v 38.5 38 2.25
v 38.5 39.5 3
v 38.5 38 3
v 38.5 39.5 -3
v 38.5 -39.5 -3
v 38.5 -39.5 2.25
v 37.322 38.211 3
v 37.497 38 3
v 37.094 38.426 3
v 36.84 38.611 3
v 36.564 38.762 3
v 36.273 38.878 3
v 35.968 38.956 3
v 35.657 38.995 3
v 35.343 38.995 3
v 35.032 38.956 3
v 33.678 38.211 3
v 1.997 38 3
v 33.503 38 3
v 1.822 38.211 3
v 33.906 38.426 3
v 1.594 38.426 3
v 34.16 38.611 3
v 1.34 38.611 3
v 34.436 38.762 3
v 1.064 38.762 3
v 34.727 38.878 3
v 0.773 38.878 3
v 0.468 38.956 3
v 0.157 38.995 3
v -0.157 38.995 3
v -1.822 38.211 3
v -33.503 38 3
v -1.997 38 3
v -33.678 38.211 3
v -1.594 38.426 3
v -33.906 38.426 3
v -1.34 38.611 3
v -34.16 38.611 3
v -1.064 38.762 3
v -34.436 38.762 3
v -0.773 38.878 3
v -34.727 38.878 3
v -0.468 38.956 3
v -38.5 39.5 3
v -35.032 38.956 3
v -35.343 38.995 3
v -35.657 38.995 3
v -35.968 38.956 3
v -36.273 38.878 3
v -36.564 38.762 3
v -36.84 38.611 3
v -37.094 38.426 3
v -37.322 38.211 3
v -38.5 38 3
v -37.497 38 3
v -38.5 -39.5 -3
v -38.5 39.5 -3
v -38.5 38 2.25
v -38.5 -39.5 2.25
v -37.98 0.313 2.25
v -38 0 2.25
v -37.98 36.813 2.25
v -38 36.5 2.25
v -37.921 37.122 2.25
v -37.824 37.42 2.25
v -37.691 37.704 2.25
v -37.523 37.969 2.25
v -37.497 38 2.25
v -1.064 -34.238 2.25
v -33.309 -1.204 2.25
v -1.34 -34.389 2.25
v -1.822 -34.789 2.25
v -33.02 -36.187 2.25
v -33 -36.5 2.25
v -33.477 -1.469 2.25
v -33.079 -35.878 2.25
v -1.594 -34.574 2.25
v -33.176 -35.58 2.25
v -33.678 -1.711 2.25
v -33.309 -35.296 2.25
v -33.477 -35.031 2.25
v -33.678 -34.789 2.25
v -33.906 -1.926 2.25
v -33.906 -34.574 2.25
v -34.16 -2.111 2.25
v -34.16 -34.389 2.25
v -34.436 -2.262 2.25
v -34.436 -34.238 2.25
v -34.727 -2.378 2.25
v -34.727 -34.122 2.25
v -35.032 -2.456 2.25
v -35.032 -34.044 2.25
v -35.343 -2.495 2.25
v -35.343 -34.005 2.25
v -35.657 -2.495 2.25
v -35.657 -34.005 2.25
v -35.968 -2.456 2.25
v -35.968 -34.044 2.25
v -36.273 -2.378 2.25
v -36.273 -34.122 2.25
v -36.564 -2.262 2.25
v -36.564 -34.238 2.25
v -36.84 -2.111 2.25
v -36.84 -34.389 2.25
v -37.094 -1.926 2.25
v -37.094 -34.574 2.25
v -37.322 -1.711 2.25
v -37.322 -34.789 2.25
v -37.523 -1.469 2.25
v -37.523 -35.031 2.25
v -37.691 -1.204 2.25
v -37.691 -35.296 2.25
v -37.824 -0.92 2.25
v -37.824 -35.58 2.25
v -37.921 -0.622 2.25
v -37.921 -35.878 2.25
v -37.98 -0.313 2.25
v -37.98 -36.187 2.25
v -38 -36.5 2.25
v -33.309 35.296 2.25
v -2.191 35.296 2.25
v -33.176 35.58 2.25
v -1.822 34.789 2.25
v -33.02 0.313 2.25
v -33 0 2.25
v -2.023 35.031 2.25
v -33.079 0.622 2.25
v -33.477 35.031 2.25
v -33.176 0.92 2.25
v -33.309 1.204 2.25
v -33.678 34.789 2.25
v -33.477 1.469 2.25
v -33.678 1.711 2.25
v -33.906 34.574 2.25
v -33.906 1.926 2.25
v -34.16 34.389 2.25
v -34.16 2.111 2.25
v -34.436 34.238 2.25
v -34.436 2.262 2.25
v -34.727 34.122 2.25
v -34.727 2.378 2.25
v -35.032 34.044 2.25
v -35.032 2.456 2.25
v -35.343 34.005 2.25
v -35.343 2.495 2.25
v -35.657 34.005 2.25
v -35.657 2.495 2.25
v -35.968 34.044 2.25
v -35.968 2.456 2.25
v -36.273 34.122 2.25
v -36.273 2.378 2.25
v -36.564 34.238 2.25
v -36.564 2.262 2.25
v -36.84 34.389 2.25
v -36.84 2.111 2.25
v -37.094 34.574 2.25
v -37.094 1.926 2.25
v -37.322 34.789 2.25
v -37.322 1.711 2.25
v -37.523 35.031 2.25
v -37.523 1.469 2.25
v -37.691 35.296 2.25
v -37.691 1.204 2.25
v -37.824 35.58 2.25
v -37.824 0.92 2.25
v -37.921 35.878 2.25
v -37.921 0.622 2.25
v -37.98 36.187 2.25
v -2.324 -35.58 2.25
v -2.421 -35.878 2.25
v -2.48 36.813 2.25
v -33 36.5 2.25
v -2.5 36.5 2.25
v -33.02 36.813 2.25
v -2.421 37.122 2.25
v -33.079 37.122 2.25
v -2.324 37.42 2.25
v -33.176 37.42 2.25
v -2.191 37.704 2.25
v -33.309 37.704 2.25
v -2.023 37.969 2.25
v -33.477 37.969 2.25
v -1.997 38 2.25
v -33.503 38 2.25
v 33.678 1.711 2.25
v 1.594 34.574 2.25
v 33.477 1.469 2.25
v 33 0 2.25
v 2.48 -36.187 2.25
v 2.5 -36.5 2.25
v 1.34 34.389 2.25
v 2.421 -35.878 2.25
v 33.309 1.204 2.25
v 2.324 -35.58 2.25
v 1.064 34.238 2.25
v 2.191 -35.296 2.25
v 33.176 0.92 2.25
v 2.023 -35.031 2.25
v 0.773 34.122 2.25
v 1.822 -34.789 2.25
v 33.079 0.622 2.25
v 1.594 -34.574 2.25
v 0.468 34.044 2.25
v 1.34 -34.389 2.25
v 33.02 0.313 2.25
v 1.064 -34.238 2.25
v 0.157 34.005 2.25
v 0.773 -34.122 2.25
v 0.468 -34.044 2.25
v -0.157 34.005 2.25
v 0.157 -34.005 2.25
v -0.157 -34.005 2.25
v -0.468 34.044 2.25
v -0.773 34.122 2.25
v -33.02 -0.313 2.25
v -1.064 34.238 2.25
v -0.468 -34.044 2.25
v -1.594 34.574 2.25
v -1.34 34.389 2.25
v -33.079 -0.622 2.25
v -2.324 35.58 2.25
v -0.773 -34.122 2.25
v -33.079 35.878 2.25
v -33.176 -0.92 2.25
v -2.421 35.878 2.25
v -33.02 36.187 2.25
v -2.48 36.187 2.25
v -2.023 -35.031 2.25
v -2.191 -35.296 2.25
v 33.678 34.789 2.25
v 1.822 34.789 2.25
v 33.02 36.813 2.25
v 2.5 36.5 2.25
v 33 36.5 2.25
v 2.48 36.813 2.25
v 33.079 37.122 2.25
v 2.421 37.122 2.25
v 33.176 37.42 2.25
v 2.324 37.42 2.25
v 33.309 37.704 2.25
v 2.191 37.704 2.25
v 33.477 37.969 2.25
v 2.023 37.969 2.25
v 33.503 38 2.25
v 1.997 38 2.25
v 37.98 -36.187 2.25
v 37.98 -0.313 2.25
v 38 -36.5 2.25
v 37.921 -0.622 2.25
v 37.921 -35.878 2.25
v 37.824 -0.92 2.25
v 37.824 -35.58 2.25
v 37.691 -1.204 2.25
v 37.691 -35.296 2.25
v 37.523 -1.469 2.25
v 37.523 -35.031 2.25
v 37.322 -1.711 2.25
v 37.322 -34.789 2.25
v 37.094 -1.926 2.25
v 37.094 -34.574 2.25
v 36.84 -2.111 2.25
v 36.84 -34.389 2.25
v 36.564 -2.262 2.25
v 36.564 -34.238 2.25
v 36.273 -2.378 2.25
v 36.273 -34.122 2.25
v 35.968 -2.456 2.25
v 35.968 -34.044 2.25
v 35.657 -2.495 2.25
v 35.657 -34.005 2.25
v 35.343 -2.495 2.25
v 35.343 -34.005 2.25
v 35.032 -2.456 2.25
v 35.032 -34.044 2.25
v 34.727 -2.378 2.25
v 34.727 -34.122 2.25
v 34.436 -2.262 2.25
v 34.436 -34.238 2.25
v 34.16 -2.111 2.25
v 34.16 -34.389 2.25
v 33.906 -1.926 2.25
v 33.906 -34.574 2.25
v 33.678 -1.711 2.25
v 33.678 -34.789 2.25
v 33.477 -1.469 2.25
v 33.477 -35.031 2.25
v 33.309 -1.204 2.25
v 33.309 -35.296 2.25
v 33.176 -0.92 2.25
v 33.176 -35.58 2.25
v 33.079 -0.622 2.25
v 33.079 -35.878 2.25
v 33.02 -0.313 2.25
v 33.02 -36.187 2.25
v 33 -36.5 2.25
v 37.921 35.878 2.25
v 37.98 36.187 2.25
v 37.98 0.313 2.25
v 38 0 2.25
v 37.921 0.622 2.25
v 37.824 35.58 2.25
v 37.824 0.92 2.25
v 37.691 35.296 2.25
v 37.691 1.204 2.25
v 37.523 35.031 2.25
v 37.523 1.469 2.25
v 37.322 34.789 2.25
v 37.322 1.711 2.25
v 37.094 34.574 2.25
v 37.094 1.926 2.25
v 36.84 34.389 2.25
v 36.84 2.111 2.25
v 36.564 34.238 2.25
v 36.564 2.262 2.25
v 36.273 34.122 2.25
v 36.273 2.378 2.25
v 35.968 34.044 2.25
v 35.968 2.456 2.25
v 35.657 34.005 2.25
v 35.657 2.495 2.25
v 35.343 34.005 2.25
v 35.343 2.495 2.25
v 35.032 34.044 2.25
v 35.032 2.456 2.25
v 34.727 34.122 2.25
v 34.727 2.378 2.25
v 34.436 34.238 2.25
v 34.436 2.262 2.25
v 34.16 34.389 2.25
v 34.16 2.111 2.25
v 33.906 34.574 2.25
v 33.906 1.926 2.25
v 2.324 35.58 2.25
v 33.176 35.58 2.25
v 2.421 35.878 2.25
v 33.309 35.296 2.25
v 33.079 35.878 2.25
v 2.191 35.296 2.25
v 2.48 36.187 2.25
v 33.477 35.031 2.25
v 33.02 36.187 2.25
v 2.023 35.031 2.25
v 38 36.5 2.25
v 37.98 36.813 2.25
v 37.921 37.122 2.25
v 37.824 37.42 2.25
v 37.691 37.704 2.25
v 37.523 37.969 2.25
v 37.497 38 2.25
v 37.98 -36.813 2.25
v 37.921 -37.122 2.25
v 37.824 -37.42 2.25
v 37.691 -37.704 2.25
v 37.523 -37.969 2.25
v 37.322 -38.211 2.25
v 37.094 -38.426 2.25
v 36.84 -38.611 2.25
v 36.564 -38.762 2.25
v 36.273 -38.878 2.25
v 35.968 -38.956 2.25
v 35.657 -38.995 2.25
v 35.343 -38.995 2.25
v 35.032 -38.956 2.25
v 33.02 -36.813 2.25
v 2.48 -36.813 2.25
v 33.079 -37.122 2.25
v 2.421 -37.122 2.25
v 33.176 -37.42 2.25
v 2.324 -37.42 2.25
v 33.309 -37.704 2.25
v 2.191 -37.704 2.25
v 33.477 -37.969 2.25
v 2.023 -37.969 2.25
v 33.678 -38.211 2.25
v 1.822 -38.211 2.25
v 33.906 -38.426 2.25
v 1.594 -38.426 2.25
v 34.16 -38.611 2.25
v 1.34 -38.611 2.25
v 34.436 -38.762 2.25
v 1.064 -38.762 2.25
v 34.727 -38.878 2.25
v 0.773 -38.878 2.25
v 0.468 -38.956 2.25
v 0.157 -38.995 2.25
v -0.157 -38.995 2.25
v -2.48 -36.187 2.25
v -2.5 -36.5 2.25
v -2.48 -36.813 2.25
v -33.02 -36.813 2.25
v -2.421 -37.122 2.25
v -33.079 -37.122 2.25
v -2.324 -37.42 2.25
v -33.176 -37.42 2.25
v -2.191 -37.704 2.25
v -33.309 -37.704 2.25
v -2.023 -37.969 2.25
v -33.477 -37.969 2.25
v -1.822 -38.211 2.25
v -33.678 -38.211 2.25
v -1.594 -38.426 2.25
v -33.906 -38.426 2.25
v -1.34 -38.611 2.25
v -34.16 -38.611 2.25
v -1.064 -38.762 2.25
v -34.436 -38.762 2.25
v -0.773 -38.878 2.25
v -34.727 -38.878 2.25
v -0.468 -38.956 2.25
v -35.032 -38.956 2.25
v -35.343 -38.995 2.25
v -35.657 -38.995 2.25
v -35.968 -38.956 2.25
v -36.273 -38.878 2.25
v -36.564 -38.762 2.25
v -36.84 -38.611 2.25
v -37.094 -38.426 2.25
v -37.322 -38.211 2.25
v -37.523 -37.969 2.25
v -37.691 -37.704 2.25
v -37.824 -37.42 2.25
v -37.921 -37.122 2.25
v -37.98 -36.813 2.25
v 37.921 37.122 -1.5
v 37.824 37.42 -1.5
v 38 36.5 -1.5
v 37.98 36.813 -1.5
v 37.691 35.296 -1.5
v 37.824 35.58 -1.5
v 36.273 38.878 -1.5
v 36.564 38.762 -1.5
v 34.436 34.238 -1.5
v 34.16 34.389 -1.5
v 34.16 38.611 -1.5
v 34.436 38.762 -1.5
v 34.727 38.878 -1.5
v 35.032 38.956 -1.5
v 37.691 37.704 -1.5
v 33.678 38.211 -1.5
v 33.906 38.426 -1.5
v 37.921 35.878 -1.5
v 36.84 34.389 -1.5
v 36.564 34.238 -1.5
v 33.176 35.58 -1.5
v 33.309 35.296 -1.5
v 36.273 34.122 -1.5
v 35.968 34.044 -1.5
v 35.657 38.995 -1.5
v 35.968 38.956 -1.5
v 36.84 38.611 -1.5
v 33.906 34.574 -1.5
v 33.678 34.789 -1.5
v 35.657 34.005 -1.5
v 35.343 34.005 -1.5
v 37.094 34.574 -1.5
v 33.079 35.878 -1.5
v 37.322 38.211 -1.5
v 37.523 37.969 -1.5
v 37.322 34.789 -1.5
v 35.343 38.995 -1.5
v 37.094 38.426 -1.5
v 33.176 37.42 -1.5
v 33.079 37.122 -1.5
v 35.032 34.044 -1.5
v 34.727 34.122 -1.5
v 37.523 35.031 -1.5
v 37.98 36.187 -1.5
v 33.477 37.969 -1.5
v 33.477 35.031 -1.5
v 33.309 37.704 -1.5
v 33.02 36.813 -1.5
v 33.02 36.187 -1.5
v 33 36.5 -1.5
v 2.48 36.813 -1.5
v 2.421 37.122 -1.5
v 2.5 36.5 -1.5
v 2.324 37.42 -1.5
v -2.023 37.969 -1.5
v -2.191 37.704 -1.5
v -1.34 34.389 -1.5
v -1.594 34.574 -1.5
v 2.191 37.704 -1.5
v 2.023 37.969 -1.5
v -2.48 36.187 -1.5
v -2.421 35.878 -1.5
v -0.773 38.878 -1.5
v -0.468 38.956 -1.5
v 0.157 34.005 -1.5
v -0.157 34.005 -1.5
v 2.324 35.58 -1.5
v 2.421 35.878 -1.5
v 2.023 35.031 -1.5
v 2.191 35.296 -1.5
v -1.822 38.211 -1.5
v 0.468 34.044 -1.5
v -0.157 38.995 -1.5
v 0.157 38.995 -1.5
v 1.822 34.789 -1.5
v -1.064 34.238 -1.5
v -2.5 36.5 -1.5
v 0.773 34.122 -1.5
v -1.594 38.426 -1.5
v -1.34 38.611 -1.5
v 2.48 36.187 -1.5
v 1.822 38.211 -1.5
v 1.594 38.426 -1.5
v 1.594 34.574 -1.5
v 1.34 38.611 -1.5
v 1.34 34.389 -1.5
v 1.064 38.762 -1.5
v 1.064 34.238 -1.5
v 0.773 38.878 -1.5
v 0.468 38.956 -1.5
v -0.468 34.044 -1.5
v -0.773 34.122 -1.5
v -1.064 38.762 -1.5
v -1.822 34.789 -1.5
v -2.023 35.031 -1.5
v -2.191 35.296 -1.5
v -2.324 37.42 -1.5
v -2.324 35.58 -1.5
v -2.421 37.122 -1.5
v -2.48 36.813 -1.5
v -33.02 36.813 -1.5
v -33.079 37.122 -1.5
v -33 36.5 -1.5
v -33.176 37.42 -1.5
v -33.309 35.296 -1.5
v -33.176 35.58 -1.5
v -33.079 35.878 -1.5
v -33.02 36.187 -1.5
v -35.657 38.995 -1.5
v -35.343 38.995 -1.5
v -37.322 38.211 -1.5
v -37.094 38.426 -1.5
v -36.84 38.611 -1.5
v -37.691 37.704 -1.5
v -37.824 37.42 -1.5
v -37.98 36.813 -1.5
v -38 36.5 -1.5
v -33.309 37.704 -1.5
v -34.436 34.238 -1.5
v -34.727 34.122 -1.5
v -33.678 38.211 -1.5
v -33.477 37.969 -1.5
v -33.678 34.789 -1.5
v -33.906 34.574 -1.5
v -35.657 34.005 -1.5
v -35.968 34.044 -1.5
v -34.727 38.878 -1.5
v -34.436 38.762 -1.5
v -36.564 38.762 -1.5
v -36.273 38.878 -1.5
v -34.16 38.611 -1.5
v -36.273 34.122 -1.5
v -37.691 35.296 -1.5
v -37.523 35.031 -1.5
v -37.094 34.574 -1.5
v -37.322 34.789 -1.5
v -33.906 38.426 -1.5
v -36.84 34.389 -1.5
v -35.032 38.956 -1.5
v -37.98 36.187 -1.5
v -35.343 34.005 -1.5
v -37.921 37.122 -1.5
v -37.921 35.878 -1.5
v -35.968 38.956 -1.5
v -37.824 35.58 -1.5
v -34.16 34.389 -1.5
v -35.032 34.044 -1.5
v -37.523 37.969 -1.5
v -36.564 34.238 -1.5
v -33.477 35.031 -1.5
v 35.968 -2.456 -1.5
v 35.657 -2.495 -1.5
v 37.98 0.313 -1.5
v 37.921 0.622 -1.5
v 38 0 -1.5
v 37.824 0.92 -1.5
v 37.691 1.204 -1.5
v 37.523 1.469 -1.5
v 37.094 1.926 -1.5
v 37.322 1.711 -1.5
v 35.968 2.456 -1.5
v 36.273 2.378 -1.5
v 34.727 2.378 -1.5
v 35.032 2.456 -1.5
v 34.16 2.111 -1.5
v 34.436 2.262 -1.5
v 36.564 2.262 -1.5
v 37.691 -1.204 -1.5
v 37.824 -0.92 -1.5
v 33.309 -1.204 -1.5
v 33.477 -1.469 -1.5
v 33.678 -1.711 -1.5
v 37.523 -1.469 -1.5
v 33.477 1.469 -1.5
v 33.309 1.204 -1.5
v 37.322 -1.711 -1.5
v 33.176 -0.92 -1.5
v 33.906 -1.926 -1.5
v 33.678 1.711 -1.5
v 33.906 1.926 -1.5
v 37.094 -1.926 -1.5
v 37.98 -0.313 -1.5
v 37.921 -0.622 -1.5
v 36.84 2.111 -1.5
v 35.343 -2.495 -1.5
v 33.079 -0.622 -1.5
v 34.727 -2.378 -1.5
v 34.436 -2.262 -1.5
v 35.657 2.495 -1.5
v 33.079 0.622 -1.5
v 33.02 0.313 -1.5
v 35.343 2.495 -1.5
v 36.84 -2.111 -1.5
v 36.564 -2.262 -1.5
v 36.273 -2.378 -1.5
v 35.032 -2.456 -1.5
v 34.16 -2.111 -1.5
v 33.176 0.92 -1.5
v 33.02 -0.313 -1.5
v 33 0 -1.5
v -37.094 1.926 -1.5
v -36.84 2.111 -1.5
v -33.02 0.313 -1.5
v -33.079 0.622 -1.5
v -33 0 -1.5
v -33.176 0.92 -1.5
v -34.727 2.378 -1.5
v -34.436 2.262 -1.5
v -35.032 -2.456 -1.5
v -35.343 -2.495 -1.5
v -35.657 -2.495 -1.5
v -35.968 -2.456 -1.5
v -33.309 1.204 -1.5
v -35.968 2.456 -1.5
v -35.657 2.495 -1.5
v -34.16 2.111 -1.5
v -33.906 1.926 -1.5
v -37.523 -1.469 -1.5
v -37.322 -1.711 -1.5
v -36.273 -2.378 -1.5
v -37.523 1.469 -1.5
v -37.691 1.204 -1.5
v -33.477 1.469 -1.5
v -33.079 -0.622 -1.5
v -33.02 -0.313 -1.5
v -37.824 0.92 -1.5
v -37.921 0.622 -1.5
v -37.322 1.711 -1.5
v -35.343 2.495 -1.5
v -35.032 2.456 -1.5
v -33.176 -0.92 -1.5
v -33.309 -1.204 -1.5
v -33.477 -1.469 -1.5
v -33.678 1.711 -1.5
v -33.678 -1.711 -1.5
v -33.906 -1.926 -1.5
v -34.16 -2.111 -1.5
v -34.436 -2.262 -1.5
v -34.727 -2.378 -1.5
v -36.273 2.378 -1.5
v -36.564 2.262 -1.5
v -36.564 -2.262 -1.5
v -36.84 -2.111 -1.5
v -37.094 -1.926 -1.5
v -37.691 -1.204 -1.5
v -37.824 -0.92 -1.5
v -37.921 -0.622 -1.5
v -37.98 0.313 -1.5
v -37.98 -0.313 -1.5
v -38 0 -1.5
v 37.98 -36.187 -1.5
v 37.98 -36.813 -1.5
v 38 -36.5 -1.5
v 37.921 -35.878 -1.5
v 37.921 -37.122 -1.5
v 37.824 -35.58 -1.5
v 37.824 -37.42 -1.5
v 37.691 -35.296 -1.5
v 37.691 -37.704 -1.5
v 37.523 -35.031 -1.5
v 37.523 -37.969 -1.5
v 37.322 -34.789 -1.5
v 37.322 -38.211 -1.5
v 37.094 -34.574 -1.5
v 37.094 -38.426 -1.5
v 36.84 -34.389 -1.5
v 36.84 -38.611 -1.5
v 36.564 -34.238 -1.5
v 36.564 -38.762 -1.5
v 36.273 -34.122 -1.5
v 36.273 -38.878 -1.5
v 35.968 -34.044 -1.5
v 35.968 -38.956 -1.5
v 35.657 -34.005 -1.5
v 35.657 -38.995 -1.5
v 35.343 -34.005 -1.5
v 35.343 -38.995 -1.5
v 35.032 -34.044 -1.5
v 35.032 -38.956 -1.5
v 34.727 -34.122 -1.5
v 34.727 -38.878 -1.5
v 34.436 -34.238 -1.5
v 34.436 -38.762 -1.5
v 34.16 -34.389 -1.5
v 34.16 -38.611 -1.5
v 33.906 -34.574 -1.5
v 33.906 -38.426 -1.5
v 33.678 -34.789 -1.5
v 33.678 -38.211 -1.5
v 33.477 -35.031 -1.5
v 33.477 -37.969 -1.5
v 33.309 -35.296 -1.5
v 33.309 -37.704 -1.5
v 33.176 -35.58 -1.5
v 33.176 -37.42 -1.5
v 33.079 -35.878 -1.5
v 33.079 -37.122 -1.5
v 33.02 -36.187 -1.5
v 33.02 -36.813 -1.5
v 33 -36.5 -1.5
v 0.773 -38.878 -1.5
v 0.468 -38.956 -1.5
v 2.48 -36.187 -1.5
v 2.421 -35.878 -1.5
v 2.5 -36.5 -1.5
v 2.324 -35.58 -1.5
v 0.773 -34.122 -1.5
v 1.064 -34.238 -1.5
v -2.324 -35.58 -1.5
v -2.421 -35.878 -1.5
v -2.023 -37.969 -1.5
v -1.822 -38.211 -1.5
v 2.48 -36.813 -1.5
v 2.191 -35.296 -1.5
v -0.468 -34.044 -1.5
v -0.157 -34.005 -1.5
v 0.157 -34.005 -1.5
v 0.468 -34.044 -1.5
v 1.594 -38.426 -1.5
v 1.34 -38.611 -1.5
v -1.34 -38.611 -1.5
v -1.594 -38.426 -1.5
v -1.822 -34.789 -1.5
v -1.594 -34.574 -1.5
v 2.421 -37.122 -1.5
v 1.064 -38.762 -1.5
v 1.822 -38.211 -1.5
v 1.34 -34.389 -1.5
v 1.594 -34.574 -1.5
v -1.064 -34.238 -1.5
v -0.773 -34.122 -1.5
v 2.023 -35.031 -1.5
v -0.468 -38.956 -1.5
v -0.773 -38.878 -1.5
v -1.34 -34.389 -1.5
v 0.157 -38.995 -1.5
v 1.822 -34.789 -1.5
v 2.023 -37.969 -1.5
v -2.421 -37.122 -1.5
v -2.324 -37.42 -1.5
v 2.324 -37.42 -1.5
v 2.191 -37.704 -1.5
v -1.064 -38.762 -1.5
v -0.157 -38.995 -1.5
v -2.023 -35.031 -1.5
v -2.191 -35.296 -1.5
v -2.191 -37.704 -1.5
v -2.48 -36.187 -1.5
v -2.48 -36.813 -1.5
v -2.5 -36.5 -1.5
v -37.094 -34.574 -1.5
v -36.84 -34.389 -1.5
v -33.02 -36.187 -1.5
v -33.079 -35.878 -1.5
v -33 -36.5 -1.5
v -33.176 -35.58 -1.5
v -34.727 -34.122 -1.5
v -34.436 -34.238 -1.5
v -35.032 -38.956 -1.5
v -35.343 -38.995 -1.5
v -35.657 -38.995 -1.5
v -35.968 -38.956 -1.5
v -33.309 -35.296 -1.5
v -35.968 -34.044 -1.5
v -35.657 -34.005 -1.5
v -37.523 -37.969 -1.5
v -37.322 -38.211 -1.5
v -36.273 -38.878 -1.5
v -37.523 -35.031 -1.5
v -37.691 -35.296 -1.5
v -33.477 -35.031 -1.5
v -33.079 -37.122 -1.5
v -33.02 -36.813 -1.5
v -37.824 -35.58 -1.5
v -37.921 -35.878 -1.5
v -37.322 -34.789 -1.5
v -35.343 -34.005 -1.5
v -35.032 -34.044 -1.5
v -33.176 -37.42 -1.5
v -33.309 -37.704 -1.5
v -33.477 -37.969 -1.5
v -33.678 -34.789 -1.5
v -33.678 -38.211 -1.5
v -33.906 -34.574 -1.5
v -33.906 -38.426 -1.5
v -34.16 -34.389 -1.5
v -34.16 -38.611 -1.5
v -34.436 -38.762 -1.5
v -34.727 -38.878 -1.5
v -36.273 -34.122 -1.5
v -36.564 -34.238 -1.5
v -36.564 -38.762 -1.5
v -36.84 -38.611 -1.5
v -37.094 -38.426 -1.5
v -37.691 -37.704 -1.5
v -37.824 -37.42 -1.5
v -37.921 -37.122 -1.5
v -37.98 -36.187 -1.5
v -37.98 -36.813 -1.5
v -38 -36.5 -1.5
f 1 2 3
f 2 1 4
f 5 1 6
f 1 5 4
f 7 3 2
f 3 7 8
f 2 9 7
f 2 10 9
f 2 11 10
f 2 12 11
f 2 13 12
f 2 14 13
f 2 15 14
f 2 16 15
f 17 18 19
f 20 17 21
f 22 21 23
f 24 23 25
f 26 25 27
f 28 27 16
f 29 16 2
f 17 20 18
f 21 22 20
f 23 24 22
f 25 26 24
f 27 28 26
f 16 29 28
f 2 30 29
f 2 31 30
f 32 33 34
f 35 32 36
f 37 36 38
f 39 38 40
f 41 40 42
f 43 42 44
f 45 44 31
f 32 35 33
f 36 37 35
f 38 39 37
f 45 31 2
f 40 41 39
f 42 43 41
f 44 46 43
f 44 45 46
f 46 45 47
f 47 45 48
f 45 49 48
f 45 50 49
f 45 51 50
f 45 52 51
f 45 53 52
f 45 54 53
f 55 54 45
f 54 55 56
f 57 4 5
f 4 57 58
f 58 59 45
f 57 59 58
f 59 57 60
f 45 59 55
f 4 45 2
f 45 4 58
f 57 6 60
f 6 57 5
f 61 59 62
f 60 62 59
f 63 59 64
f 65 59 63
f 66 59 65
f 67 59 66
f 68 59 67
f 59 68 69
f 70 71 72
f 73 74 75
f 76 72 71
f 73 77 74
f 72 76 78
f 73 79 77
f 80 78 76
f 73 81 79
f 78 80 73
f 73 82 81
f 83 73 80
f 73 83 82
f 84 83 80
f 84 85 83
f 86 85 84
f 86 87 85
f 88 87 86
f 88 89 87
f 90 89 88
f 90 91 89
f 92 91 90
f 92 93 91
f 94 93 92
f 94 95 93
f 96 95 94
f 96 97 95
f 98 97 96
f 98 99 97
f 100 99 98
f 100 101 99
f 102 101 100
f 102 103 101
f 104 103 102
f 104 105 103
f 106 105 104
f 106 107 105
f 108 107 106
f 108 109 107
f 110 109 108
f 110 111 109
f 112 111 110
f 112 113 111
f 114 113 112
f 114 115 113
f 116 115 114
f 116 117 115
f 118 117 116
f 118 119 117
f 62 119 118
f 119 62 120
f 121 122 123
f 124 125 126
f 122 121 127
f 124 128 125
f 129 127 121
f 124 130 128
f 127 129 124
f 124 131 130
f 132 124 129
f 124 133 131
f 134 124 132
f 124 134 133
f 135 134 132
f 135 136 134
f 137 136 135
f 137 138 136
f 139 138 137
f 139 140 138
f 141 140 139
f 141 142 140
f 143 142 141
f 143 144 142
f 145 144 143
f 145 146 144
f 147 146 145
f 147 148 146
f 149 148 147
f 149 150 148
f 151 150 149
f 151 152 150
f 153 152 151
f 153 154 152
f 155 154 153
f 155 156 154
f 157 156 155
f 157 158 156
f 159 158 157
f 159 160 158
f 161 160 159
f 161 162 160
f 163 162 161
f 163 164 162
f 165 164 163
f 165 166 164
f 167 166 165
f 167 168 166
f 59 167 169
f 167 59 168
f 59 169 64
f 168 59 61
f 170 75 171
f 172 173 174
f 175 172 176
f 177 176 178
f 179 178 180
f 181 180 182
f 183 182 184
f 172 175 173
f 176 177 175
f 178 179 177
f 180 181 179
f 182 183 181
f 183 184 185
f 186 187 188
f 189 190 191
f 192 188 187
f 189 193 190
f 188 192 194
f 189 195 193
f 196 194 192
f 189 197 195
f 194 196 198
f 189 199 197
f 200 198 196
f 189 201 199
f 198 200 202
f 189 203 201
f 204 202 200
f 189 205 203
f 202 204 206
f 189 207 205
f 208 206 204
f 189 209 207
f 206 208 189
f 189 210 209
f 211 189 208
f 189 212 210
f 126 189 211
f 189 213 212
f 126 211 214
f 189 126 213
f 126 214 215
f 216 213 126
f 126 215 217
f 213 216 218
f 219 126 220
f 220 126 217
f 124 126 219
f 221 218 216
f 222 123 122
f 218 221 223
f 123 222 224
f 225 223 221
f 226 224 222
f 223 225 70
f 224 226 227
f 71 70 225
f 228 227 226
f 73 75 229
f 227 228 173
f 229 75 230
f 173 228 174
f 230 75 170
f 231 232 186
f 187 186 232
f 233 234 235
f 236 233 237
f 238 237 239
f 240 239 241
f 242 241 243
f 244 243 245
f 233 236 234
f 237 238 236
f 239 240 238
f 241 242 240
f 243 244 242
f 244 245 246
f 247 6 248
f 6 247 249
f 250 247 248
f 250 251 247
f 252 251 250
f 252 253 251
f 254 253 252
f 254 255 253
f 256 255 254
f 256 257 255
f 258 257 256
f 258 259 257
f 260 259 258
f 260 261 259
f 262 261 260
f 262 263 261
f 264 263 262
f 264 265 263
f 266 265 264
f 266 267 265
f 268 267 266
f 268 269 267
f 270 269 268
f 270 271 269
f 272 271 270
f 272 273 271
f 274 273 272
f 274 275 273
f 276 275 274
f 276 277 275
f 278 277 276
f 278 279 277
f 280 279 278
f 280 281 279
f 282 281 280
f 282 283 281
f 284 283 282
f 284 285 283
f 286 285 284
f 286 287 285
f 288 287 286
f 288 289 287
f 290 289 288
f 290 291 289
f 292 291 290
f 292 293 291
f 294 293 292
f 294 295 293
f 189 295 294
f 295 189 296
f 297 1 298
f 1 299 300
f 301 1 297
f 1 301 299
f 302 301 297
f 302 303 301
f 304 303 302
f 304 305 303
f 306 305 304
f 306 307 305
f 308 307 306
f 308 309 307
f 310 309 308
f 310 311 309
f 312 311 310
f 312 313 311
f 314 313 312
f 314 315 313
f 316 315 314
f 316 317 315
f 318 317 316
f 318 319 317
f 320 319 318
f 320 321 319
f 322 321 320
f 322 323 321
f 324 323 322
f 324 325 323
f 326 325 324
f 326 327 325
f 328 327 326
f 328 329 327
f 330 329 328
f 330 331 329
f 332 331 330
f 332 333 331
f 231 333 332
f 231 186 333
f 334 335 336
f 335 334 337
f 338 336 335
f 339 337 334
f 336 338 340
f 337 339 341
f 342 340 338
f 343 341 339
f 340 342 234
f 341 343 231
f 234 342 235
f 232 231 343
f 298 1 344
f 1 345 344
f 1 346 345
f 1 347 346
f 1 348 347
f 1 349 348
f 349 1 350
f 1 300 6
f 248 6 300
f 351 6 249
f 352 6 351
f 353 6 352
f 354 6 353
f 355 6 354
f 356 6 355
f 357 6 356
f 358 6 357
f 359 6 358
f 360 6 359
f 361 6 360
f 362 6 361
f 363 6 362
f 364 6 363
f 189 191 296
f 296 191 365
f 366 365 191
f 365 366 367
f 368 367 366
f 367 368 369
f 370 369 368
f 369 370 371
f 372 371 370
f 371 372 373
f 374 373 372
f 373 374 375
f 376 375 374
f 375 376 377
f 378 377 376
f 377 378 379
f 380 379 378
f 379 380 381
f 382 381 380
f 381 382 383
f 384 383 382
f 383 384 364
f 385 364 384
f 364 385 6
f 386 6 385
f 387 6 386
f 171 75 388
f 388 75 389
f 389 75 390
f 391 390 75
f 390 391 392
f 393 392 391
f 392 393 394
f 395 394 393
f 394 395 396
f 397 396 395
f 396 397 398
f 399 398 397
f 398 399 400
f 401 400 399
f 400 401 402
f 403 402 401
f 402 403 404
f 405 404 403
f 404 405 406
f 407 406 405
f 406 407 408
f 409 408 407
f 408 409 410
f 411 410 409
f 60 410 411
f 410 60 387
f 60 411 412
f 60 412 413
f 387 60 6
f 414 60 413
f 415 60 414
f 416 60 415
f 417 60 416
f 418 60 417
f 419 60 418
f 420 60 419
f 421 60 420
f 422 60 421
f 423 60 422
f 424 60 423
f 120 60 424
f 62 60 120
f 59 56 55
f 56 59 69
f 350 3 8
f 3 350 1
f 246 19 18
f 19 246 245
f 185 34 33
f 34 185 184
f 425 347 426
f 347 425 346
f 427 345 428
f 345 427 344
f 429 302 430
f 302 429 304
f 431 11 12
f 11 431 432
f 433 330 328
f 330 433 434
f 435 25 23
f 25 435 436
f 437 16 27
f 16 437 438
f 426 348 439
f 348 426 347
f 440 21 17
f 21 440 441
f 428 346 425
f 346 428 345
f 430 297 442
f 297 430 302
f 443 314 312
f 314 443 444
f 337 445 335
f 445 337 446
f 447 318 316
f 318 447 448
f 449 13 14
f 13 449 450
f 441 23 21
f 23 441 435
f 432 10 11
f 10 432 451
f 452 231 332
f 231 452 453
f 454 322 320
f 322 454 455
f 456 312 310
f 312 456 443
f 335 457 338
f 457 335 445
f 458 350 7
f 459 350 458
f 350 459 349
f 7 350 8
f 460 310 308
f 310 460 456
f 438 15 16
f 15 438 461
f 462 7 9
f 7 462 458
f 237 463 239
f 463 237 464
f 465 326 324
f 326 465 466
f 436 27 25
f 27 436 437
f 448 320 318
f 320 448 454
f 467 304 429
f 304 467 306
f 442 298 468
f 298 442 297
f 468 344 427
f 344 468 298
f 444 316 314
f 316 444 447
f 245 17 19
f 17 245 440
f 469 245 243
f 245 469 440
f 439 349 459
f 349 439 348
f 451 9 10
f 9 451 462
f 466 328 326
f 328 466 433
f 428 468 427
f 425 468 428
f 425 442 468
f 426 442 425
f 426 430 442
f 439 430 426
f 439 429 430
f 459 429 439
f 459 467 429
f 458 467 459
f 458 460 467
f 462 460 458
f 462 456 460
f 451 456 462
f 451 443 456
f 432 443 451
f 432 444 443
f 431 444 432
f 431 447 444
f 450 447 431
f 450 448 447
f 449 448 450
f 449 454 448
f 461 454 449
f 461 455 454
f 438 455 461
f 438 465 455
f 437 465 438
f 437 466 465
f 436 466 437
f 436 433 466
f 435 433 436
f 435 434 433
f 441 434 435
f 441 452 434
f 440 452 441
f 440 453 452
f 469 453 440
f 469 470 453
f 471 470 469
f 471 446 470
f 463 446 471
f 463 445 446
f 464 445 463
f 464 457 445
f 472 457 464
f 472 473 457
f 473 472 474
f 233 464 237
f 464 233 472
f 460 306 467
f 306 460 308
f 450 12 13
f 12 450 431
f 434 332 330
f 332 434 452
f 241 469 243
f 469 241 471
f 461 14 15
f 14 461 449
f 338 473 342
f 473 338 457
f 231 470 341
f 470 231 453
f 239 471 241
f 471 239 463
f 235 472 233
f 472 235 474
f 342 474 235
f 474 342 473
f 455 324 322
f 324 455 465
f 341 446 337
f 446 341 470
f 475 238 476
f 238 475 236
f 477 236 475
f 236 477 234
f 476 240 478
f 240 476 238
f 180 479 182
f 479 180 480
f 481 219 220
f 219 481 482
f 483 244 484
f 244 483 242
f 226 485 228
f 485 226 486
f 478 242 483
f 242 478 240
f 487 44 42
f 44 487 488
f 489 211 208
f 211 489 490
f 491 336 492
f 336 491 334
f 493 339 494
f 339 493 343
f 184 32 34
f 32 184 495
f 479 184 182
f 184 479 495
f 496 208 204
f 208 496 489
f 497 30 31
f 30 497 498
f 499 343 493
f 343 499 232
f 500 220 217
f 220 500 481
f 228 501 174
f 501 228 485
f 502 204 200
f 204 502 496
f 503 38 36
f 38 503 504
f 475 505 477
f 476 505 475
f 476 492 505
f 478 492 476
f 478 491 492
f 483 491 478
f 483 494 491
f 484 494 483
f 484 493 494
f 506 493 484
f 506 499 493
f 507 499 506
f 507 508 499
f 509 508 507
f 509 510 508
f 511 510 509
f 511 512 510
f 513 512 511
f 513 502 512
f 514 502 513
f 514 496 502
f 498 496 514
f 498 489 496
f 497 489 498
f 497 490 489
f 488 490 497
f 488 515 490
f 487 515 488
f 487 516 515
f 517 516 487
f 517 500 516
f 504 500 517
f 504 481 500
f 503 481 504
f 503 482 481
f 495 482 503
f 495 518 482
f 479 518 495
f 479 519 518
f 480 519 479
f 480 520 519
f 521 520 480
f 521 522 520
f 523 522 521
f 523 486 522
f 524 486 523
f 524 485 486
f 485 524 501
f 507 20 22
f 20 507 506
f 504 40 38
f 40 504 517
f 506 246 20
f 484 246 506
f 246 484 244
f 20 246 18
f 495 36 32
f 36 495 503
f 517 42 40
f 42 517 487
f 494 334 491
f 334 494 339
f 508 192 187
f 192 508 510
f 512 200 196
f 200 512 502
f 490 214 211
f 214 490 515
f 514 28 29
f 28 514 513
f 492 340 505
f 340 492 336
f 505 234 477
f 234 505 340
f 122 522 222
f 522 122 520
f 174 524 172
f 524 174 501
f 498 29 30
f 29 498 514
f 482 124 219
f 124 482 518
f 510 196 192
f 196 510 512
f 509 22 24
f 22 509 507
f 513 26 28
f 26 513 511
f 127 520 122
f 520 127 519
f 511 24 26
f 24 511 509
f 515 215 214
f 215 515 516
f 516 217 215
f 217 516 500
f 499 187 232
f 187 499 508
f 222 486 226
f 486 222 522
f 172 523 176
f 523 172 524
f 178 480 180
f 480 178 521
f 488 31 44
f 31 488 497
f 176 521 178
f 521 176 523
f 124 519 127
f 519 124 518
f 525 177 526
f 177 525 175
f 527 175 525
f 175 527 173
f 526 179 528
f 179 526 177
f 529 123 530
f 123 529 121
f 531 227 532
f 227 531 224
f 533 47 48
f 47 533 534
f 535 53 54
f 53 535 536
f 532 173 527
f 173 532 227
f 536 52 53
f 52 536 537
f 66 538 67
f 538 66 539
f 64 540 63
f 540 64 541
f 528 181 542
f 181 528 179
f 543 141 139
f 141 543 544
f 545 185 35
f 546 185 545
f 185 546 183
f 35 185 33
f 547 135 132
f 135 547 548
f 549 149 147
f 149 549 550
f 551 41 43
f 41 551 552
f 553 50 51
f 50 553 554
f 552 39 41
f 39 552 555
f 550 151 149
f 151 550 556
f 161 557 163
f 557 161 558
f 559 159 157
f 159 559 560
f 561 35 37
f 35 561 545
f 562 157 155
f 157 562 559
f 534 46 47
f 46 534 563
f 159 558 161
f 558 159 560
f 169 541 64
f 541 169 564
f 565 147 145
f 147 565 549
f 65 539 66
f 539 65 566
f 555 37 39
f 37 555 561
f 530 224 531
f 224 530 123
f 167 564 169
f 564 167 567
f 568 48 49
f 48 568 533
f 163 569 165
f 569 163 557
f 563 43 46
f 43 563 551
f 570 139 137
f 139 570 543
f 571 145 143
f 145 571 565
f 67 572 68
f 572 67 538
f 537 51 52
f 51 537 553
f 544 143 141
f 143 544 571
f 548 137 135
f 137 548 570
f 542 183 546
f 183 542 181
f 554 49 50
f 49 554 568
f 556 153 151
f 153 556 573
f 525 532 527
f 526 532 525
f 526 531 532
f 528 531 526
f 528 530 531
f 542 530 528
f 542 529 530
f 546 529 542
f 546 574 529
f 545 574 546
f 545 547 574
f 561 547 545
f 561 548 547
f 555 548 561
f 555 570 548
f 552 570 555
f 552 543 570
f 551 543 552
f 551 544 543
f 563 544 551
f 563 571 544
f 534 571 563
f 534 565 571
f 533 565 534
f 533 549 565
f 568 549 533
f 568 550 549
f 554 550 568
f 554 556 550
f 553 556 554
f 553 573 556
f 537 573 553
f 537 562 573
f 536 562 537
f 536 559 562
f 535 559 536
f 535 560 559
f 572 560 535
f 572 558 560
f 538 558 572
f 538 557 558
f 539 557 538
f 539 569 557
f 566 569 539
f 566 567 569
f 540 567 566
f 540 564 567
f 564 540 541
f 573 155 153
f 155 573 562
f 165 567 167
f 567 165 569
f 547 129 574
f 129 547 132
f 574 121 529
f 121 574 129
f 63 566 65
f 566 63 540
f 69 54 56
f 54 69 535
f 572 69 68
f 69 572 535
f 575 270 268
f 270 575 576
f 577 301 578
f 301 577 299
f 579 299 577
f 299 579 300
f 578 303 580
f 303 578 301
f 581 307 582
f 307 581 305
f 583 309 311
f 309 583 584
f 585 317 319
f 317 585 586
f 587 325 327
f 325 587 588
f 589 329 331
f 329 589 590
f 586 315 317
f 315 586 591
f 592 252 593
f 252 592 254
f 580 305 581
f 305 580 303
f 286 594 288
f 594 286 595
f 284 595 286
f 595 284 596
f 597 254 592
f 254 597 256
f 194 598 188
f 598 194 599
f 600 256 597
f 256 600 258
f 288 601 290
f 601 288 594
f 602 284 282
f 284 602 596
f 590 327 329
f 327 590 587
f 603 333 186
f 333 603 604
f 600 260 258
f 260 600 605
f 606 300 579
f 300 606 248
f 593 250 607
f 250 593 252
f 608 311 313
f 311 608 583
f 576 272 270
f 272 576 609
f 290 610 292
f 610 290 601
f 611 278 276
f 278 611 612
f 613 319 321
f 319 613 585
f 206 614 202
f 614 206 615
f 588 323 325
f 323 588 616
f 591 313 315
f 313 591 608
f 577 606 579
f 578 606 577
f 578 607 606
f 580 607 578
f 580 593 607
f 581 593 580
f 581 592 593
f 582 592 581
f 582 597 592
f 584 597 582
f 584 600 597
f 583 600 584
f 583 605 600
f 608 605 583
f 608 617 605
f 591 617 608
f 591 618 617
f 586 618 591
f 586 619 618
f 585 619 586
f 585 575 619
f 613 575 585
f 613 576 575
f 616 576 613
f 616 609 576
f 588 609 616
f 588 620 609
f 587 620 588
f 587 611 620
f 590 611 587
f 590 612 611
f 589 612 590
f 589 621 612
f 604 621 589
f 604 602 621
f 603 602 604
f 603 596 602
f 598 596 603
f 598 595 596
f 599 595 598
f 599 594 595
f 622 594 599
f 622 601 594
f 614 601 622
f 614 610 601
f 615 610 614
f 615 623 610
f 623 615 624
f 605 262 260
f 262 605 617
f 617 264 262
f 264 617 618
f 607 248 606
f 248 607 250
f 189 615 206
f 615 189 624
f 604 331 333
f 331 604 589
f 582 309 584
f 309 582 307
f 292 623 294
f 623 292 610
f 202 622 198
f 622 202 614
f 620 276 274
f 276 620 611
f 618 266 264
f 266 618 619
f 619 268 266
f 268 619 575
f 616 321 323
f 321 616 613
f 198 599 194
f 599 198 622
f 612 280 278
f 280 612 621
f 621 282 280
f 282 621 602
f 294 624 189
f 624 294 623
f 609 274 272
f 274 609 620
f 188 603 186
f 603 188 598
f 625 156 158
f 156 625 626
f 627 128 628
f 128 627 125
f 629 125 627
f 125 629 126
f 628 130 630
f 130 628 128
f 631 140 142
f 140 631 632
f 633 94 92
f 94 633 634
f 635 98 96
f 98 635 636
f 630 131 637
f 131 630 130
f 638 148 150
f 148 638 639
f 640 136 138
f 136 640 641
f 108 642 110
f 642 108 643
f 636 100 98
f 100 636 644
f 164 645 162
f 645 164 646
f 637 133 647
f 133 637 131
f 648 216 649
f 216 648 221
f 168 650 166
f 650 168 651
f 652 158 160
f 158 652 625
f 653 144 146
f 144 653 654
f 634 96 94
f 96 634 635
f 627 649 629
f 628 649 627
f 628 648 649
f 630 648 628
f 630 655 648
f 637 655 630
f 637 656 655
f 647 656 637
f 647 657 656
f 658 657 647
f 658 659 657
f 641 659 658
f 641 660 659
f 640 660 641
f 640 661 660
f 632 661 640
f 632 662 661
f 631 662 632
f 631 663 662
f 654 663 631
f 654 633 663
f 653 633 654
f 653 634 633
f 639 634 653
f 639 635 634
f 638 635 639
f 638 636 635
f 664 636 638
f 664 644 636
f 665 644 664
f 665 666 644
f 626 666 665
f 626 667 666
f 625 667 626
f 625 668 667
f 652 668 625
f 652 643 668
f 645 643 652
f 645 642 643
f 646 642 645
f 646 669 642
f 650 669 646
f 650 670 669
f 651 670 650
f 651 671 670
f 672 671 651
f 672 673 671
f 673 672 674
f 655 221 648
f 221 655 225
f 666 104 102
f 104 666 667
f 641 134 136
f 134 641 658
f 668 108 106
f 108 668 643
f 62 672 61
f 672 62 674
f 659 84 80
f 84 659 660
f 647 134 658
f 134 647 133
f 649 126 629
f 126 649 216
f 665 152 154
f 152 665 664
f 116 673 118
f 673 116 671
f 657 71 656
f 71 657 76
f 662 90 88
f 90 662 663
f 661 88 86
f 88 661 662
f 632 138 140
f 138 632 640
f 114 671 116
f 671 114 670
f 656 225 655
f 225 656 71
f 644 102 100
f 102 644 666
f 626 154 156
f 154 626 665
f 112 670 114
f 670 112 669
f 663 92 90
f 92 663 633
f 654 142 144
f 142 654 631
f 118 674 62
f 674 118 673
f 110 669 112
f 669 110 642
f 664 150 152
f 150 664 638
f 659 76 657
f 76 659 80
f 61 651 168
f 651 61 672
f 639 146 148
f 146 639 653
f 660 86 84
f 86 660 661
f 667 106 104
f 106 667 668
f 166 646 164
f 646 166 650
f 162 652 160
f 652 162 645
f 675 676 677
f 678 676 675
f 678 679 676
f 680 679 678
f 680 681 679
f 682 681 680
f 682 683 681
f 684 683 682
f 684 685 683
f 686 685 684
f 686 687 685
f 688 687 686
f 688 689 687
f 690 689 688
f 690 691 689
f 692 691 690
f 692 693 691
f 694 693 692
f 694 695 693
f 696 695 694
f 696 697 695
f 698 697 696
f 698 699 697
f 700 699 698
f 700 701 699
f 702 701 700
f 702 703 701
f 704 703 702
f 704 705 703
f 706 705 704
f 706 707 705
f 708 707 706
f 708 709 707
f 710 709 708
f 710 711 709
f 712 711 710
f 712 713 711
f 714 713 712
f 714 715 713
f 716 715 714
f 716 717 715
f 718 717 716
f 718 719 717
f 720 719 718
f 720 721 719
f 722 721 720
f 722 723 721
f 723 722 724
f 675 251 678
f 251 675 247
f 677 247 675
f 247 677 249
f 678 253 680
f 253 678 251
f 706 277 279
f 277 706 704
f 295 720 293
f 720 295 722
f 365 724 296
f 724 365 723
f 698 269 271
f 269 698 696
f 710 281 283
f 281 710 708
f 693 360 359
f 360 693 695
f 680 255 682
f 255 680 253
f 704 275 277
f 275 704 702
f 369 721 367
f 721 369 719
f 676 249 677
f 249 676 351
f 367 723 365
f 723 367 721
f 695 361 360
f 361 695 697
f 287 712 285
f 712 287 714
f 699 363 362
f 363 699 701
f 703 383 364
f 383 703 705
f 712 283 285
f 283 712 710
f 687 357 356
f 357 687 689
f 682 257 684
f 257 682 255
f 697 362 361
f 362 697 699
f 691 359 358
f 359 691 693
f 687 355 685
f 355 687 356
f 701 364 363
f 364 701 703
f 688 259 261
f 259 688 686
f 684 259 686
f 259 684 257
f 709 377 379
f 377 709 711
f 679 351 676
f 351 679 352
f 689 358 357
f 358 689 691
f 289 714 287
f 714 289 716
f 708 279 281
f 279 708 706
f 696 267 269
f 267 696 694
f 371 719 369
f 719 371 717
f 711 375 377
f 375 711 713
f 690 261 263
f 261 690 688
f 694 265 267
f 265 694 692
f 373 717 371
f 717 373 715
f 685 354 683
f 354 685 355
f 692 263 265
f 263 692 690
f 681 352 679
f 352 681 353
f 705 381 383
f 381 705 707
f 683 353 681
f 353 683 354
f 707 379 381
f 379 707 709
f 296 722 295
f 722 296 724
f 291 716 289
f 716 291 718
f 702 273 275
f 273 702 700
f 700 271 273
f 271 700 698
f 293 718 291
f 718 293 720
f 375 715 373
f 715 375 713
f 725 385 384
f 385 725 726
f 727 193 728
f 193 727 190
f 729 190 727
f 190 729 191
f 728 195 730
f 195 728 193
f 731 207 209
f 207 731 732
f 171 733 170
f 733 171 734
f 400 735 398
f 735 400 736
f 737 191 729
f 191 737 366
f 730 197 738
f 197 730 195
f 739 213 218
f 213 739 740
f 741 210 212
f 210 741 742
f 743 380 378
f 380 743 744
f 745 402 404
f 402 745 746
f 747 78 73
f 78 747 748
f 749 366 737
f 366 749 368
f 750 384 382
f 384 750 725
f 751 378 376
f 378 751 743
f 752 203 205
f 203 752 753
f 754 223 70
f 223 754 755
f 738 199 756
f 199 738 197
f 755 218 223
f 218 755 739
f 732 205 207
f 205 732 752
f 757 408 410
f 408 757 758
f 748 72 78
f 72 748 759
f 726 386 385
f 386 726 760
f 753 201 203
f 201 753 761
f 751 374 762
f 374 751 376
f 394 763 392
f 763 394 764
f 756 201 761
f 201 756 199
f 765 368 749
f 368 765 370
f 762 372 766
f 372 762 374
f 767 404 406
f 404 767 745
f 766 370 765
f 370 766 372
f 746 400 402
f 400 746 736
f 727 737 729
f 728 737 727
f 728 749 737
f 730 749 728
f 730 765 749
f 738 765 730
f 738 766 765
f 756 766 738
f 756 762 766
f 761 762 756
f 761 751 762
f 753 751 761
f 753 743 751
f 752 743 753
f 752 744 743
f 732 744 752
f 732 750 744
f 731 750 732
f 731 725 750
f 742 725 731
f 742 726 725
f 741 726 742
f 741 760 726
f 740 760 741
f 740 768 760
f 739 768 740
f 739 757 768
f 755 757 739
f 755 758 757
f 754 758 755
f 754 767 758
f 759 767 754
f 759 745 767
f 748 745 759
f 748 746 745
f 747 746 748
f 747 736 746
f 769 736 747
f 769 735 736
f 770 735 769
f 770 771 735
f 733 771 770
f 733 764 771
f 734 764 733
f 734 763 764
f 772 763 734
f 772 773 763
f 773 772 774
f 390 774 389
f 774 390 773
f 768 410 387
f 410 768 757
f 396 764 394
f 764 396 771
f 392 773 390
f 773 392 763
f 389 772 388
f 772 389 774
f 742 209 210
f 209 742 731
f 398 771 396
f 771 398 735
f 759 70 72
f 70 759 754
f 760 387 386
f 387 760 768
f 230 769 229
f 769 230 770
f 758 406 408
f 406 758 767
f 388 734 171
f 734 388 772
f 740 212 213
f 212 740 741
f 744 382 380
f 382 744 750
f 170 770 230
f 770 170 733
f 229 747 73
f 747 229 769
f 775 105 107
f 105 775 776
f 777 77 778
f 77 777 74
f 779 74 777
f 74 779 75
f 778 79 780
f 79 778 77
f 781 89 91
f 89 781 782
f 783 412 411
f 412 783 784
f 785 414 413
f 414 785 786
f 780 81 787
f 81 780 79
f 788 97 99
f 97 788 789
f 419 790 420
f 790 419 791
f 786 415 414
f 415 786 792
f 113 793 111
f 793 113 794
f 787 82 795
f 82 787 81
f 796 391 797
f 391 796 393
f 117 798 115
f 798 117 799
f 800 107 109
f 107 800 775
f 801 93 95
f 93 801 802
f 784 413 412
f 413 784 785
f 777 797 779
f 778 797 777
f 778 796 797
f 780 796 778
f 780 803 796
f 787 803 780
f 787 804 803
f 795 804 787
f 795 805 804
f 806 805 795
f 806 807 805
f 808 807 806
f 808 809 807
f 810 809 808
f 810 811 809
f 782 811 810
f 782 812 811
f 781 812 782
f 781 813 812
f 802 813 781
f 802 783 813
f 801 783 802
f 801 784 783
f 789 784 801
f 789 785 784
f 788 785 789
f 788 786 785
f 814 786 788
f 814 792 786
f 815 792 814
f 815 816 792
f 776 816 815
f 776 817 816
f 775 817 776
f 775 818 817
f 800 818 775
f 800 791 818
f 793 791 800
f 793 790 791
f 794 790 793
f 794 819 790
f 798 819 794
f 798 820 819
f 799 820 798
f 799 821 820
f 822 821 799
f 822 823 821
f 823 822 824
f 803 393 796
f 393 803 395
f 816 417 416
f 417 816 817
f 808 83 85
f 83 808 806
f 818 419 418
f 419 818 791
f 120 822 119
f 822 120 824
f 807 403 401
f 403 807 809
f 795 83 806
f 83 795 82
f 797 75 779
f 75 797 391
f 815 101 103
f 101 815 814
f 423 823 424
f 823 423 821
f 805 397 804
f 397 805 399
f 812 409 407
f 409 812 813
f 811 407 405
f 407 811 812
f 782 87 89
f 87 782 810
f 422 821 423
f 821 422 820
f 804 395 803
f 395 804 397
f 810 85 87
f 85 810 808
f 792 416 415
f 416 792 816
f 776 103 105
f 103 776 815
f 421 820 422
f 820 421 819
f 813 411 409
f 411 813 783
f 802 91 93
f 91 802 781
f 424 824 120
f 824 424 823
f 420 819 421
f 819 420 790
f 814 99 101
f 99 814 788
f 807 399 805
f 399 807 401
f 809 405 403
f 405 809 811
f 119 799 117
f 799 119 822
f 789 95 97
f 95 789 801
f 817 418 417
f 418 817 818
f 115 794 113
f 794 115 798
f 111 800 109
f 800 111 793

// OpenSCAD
inset_x = 80;
inset_y = 78;
inset_z = 2.5;

outer_x = 77;
outer_y = 79;
outer_z = 6;

hole_r = 2.5;
hole_z = 5;
$fn=50;

edge_inset = 6;

hole_x = ((outer_x - edge_inset) / 2);
neg_hole_x = (((outer_x - edge_inset) / 2) * -1);
hole_y = ((outer_y - edge_inset) / 2);
neg_hole_y = (((outer_y - edge_inset) / 2) * -1 );

difference() {
    cube([outer_x, outer_y, outer_z], center = true);
    translate([0, -1, 3.5])
    {
        cube([inset_x, inset_y, inset_z], center = true);
    }
    
    /* Top right */
    translate([hole_x, hole_y, -1.5])
    {
        cylinder(hole_z, hole_r, hole_r, false);
    }
    
    /* Top Mid */
    translate([0, hole_y, -1.5])
    {
        cylinder(outer_x, hole_r, hole_r, false);
    }

    /* Top Left */
    translate([neg_hole_x, hole_y, -1.5])
    {
        cylinder(hole_z, hole_r, hole_r, false);
    }

    /* Mid Right */
    translate([hole_x, 0, -1.5])
    {
        cylinder(hole_z, hole_r, hole_r, false);
    }   
    
    /* Mid Left */
    translate([neg_hole_x, 0, -1.5])
    {
        cylinder(hole_z, hole_r, hole_r, false);
    }
    
    /* Bottom Right */
    translate([hole_x, neg_hole_y, -1.5])
    {
        cylinder(hole_z, hole_r, hole_r, false);
    }
    
    /* Bottom Mid */
    translate([0, neg_hole_y, -1.5])
    {
        cylinder(outer_x, hole_r, hole_r, false);
    }

    /* Bottom Left */
    translate([neg_hole_x, neg_hole_y, -1.5])
    {
        cylinder(hole_z, hole_r, hole_r, false);
    }
}
